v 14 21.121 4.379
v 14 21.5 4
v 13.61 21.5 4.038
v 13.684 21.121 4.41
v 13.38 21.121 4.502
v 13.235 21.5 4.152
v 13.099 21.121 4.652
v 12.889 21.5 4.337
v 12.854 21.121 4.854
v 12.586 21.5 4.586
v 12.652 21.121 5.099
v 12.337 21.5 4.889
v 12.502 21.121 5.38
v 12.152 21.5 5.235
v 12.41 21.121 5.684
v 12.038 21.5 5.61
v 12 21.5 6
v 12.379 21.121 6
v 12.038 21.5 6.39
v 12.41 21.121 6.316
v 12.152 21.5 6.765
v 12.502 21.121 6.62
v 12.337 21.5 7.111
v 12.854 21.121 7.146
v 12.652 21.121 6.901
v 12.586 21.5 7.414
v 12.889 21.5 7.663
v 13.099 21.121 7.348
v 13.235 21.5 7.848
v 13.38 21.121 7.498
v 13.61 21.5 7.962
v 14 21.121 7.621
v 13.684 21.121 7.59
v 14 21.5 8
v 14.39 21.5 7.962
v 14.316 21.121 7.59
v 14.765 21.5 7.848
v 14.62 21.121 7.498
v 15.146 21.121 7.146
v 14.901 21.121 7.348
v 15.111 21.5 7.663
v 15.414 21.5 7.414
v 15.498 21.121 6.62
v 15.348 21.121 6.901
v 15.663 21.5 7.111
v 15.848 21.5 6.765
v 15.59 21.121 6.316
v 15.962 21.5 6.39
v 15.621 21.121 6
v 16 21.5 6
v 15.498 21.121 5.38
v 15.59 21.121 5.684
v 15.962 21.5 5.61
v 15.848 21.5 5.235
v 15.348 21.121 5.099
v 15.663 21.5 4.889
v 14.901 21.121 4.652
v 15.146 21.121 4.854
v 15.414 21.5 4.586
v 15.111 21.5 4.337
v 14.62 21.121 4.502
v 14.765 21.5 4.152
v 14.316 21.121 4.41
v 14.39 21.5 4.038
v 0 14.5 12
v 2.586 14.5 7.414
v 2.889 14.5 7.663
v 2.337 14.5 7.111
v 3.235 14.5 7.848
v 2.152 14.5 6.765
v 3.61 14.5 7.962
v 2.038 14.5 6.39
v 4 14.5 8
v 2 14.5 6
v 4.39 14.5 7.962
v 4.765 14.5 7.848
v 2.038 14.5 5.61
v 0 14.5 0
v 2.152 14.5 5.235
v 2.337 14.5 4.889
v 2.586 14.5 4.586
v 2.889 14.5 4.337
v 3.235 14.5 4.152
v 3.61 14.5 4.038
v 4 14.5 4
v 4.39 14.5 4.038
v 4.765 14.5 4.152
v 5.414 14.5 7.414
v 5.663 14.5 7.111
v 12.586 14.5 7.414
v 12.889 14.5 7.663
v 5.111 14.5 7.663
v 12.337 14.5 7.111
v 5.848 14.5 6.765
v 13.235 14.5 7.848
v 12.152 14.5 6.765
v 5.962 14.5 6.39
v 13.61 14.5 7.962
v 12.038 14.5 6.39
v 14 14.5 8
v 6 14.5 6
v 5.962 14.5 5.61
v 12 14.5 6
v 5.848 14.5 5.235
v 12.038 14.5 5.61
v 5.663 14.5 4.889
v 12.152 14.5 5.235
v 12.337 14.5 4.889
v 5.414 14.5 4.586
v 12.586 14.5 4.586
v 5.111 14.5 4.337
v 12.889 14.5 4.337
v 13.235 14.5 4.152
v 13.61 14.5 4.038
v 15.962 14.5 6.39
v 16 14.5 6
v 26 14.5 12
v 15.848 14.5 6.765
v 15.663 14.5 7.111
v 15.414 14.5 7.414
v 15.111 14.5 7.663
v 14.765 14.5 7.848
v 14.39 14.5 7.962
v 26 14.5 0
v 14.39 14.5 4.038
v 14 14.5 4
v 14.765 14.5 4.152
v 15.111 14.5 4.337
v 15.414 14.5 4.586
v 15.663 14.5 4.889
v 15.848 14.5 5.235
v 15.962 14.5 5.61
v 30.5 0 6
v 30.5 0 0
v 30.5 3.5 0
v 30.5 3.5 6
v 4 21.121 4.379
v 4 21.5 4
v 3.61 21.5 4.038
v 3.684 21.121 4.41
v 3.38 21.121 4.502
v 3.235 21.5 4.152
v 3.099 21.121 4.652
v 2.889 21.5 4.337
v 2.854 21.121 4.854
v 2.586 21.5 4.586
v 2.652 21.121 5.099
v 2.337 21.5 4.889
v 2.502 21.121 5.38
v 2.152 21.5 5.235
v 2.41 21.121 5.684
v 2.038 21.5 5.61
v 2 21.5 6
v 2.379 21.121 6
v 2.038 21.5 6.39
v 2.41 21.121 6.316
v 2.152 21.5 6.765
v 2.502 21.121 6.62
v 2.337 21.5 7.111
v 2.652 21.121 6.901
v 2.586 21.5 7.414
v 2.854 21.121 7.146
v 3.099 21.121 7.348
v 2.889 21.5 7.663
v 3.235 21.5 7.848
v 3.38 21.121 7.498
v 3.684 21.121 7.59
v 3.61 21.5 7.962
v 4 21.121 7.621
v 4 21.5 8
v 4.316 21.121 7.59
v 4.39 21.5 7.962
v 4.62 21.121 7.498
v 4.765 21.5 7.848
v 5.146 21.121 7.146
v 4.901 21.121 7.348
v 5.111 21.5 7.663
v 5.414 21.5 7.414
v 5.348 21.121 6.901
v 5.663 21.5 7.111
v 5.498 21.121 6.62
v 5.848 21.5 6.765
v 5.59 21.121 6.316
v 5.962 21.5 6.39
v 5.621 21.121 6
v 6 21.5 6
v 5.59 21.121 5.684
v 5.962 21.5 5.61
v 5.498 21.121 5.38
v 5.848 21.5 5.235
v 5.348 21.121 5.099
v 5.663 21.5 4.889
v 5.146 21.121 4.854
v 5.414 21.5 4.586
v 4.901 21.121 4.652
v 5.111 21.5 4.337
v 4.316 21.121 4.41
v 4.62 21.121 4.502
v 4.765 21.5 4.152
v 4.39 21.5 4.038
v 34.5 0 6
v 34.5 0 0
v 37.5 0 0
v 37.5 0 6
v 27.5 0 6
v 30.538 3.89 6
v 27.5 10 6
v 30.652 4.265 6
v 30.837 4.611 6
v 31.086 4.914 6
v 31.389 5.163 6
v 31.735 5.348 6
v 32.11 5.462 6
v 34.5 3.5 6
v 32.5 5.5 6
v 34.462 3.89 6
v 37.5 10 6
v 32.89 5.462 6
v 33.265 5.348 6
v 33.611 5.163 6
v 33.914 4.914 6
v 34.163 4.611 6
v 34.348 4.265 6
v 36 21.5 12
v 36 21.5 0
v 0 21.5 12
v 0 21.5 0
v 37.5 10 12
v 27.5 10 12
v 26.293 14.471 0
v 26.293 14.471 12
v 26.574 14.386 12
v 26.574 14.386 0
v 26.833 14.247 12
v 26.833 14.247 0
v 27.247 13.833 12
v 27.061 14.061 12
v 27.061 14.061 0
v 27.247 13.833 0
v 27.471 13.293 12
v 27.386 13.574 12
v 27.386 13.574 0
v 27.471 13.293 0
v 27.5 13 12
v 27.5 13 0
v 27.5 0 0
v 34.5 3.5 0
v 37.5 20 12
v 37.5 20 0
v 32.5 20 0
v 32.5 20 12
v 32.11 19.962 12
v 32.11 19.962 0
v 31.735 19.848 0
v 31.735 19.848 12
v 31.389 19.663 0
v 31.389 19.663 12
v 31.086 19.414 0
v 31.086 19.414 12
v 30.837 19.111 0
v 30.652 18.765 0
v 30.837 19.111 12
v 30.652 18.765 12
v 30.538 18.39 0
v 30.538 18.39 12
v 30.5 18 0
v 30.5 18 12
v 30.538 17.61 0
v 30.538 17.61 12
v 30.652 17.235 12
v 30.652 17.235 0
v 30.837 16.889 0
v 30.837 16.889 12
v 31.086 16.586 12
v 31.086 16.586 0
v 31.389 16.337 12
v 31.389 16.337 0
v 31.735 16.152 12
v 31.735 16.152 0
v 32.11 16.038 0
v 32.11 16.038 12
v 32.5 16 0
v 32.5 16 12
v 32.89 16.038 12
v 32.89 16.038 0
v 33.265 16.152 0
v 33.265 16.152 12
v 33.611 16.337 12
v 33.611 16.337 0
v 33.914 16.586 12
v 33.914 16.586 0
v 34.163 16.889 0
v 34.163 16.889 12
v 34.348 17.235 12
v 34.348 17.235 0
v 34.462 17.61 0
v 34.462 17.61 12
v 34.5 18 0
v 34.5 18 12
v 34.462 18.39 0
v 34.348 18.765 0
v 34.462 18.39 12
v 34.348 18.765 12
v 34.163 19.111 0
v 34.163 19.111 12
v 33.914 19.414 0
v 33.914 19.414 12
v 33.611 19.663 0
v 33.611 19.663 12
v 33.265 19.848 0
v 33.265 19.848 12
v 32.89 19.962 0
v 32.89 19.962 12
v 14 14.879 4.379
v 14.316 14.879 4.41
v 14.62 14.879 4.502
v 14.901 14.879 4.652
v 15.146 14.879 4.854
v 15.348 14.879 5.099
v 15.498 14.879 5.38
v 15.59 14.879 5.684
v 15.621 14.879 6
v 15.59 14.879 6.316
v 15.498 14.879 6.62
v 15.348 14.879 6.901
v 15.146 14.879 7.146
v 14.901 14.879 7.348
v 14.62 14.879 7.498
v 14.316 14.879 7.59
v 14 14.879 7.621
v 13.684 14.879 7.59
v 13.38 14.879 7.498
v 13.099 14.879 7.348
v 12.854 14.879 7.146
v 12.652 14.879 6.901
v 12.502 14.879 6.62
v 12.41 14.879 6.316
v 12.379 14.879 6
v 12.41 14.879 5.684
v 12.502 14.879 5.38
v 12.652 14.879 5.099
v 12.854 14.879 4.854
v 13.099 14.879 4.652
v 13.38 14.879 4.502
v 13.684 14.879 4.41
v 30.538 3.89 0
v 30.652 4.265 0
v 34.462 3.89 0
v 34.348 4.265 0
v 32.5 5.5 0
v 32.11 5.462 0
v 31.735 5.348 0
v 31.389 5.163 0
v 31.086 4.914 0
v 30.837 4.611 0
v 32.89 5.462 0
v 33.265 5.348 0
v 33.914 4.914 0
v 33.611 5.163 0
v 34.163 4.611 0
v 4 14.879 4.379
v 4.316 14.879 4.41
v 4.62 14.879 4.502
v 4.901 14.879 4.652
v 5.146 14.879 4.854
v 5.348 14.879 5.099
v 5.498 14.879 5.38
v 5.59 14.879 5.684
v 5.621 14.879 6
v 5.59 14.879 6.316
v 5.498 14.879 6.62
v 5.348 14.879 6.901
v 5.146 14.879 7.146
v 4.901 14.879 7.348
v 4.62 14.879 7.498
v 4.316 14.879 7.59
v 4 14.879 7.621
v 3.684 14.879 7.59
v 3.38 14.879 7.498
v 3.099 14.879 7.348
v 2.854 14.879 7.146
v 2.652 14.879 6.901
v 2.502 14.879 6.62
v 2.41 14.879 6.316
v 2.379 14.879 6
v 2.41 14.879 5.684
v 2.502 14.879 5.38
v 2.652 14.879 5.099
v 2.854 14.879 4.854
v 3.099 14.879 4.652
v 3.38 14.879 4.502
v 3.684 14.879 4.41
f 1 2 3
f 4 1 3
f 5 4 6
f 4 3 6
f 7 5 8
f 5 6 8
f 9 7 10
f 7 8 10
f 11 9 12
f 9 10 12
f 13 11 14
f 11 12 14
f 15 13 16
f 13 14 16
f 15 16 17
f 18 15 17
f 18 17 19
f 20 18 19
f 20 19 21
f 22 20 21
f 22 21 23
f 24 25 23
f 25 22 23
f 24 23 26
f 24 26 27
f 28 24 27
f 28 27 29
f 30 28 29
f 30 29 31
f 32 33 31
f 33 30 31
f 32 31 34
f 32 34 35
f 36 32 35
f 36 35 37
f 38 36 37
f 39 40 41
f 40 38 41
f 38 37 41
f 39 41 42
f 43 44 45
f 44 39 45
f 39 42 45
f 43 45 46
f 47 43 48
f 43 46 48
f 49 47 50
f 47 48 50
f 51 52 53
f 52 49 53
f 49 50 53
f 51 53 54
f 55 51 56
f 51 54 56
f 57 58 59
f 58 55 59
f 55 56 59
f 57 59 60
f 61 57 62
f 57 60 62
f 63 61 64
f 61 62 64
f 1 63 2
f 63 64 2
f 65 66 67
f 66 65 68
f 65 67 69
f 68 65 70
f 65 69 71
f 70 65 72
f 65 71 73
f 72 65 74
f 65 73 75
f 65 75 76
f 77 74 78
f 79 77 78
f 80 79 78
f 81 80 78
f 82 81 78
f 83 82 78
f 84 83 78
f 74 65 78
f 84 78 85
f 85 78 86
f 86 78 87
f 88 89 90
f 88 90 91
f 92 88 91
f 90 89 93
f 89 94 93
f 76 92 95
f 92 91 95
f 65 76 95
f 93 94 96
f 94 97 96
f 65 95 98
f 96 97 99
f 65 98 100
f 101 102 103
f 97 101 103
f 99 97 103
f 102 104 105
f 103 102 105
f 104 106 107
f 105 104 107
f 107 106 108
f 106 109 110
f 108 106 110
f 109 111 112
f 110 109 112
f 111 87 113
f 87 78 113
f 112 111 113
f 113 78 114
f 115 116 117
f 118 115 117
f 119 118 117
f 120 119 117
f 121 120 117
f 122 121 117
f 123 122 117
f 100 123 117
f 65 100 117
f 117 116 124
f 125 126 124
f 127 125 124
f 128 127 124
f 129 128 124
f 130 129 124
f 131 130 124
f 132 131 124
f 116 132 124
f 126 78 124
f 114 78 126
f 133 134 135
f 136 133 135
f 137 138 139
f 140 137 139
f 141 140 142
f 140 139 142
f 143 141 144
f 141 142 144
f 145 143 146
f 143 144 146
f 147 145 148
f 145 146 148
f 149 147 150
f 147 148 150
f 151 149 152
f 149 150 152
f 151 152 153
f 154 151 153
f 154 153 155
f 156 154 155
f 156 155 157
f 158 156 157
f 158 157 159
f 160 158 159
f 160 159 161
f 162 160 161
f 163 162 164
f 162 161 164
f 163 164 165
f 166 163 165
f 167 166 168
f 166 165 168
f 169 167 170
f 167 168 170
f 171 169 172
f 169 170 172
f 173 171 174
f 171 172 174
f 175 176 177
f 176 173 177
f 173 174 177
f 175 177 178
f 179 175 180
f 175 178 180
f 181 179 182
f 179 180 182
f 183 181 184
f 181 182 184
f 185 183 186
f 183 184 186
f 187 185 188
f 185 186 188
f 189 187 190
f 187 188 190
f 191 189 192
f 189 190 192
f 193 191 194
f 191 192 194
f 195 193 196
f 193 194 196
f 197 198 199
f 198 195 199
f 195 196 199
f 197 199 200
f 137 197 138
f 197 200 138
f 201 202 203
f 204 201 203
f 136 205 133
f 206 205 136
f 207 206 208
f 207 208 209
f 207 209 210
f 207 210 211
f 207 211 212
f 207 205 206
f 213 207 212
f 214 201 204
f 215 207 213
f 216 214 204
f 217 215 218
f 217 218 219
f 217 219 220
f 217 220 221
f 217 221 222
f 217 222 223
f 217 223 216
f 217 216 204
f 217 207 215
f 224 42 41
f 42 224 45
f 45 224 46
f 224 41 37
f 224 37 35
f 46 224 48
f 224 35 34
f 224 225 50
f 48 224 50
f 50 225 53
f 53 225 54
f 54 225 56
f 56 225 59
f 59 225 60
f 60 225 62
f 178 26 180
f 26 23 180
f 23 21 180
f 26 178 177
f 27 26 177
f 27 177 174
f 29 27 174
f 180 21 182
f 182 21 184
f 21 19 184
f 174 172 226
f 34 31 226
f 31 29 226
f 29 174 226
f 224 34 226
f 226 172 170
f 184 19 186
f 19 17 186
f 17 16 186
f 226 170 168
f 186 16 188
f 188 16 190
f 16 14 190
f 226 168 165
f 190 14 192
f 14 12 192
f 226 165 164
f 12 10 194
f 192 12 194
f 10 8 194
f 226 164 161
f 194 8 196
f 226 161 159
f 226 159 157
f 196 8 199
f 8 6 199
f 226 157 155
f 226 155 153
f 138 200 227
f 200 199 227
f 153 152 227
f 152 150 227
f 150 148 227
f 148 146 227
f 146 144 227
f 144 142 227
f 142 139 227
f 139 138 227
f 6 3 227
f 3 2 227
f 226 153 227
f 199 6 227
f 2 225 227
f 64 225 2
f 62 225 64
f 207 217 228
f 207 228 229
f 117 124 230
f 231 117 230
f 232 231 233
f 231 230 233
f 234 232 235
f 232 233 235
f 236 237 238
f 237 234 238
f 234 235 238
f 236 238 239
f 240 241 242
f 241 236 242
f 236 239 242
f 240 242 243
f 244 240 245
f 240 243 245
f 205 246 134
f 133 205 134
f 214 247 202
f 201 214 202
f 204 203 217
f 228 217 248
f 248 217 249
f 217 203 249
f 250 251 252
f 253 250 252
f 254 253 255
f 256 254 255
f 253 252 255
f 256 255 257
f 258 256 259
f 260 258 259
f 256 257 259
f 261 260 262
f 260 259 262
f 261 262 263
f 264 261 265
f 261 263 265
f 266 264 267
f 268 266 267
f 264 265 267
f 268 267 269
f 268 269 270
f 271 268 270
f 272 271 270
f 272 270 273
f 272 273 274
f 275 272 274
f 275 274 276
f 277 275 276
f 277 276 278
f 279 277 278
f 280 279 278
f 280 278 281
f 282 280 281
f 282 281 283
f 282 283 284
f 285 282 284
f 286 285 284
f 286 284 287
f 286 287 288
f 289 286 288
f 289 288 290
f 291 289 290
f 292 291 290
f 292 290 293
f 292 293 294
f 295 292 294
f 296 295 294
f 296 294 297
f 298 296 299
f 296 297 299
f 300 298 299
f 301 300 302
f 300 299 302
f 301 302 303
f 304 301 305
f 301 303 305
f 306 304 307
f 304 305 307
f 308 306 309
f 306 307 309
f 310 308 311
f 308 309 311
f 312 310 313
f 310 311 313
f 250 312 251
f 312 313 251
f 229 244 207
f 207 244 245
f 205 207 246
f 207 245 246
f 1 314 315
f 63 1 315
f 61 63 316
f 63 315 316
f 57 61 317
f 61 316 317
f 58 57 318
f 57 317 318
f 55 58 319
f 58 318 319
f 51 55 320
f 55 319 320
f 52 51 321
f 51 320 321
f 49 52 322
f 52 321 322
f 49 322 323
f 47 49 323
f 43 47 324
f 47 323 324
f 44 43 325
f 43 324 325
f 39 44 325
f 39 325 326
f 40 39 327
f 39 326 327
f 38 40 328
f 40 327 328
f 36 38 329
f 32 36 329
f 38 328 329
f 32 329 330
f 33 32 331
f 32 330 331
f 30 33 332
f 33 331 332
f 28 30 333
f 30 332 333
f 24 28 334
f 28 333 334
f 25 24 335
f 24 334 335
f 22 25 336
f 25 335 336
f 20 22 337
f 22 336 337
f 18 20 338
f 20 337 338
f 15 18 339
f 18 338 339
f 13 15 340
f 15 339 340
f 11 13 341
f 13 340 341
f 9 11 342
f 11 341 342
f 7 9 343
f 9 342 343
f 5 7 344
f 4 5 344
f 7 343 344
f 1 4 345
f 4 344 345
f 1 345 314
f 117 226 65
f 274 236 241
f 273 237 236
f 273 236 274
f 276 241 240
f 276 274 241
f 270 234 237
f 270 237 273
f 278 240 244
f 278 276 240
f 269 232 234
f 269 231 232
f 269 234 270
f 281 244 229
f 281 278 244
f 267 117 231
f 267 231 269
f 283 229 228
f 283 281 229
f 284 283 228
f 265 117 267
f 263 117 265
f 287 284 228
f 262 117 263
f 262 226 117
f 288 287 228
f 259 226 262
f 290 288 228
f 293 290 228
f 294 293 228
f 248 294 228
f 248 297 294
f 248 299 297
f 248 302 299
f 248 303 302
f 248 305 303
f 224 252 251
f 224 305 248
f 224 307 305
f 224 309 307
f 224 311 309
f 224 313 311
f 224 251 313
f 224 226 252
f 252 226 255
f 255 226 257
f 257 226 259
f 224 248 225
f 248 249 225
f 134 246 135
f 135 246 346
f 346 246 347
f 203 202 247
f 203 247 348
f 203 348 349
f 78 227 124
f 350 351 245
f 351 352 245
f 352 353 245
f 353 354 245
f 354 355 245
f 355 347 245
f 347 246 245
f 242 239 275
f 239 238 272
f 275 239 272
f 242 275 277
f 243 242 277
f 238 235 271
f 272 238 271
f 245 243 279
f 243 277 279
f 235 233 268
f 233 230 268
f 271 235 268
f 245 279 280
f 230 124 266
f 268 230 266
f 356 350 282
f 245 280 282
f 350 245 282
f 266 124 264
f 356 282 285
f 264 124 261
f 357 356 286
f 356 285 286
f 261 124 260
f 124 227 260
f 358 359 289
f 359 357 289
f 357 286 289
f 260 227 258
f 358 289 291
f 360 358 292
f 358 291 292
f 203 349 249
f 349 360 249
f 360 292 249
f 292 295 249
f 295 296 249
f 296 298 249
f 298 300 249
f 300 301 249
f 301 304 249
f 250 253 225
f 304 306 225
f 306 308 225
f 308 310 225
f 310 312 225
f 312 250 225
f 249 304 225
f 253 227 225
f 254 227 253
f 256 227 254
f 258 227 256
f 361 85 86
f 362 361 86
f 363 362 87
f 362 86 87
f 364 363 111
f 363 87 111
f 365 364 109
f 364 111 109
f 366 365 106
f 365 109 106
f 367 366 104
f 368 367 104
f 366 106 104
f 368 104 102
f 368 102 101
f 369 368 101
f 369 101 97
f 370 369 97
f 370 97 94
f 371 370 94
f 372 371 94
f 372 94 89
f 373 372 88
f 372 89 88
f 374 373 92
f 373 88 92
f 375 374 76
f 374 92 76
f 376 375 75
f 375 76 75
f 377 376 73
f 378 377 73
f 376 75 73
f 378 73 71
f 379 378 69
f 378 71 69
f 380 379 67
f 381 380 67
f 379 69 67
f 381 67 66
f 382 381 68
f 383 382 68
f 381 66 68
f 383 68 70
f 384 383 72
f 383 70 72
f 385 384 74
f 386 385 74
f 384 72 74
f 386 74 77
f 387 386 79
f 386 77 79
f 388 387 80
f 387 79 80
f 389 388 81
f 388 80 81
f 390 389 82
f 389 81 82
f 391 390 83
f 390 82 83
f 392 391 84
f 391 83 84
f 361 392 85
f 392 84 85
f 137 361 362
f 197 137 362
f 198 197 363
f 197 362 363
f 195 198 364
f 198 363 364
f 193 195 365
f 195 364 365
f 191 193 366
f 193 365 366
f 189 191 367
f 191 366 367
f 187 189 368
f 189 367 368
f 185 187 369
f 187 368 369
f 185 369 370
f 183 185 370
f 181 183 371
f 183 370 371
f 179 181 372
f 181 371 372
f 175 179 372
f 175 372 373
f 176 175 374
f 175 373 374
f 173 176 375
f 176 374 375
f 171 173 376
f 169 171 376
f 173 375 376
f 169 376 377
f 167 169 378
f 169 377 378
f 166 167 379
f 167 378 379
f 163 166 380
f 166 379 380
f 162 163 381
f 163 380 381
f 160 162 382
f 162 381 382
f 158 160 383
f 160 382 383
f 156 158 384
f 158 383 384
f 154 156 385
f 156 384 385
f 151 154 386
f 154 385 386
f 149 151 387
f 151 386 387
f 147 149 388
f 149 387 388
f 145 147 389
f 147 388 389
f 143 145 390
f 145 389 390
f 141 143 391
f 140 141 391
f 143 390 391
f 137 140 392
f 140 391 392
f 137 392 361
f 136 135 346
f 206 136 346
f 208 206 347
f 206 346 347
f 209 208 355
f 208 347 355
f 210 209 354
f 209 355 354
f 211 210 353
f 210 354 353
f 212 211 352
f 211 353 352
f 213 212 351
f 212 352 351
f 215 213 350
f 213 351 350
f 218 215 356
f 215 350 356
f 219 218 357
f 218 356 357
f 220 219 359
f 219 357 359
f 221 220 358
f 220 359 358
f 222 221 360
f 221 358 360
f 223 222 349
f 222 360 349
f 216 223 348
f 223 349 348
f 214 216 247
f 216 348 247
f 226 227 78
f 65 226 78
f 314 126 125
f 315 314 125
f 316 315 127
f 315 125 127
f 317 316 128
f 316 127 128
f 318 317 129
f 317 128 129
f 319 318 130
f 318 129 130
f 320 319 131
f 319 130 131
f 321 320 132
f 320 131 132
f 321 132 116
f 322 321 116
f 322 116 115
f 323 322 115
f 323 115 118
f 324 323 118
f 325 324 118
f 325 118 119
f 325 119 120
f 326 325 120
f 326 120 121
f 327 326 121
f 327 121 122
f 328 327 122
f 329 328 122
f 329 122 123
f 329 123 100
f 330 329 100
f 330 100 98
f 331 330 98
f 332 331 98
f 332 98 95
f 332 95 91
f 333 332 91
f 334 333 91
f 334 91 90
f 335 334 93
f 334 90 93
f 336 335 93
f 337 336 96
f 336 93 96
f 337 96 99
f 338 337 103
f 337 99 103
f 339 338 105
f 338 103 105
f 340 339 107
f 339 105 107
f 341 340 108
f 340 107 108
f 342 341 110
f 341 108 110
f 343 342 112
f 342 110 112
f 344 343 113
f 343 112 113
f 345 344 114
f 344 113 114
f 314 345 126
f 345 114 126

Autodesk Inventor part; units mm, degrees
sketch "Sketch_1" plane through (0, 0, 0) normal (0, 0, 1) x (1, 0, 0)
  line L0 (0, 14.5) -> (26, 14.5)
  arc A0 (27.5, 13) -> (26, 14.5) centre (26, 13) ccw
  line L1 (27.5, 13) -> (27.5, 0)
  line L2 (27.5, 0) -> (30.5, 0)
  line L3 (30.5, 0) -> (30.5, 3.5)
  arc A1 (34.5, 3.5) -> (30.5, 3.5) centre (32.5, 3.5) ccw
  line L4 (34.5, 3.5) -> (34.5, 0)
  line L5 (34.5, 0) -> (37.5, 0)
  line L6 (37.5, 0) -> (37.5, 20)
  line L7 (37.5, 20) -> (36, 21.5)
  line L8 (36, 21.5) -> (0, 21.5)
  line L9 (0, 21.5) -> (0, 14.5)
extrude "Extrusion1" add sketch "Sketch_1" along normal blind 12
sketch "Sketch2" plane through (0, 0, 0) normal (0, 0, -1) x (-1, 0, 0)
  point P0 (-32.5, 18)
hole "Hole1" at (32.5, 18, 0) direction (0, 0, 1) diameter 4 depth 12
sketch "Sketch_3" plane through (4, 0, 0) normal (1, 0, 0) x (0, 0, -1)
  line L0 (-6, 14.5) -> (-6, 21.5)
  line L1 (-6, 21.5) -> (-4, 21.5)
  line L2 (-4, 21.5) -> (-4.379, 21.121)
  line L3 (-4.379, 21.121) -> (-4.379, 14.879)
  line L4 (-4.379, 14.879) -> (-4, 14.5)
  line L5 (-4, 14.5) -> (-6, 14.5)
  line L6 (-6, 14.5) -> (-6, 21.5)
revolve "Revolution1" cut sketch "Sketch_3" angle 360 about axis through (4, 14.5, 6) along (0, -1, 0)
thread "Thread1" size "M4x0.7" class "6H" standard "ISO Metric profile" full length
sketch "Sketch_4" plane through (14, 0, 0) normal (1, 0, 0) x (0, 0, -1)
  line L0 (-6, 14.5) -> (-6, 21.5)
  line L1 (-6, 21.5) -> (-4, 21.5)
  line L2 (-4, 21.5) -> (-4.379, 21.121)
  line L3 (-4.379, 21.121) -> (-4.379, 14.879)
  line L4 (-4.379, 14.879) -> (-4, 14.5)
  line L5 (-4, 14.5) -> (-6, 14.5)
  line L6 (-6, 14.5) -> (-6, 21.5)
revolve "Revolution2" cut sketch "Sketch_4" angle 360 about axis through (14, 14.5, 6) along (0, -1, 0)
thread "Thread2" size "M4x0.7" class "6H" standard "ISO Metric profile" full length
sketch "Sketch_6" plane through (0, 0, 6) normal (0, 0, 1) x (1, 0, 0)
  line L0 (27.5, 0) -> (37.5, 0)
  line L1 (37.5, 0) -> (37.5, 10)
  line L2 (37.5, 10) -> (27.5, 10)
  line L3 (27.5, 10) -> (27.5, 0)
extrude "Extrusion2" cut sketch "Sketch_6" along normal blind 6
ref_plane "body_XY" through (32.5, 18, 6) normal (0, 0, 1) x (1, 0, 0)
ref_plane "body_YZ" through (32.5, 18, 6) normal (1, 0, 0) x (0, 1, 0)
ref_plane "body_ZX" through (32.5, 18, 6) normal (0, 1, 0) x (0, 0, 1)
properties part number "MCHA-20_(g)"
